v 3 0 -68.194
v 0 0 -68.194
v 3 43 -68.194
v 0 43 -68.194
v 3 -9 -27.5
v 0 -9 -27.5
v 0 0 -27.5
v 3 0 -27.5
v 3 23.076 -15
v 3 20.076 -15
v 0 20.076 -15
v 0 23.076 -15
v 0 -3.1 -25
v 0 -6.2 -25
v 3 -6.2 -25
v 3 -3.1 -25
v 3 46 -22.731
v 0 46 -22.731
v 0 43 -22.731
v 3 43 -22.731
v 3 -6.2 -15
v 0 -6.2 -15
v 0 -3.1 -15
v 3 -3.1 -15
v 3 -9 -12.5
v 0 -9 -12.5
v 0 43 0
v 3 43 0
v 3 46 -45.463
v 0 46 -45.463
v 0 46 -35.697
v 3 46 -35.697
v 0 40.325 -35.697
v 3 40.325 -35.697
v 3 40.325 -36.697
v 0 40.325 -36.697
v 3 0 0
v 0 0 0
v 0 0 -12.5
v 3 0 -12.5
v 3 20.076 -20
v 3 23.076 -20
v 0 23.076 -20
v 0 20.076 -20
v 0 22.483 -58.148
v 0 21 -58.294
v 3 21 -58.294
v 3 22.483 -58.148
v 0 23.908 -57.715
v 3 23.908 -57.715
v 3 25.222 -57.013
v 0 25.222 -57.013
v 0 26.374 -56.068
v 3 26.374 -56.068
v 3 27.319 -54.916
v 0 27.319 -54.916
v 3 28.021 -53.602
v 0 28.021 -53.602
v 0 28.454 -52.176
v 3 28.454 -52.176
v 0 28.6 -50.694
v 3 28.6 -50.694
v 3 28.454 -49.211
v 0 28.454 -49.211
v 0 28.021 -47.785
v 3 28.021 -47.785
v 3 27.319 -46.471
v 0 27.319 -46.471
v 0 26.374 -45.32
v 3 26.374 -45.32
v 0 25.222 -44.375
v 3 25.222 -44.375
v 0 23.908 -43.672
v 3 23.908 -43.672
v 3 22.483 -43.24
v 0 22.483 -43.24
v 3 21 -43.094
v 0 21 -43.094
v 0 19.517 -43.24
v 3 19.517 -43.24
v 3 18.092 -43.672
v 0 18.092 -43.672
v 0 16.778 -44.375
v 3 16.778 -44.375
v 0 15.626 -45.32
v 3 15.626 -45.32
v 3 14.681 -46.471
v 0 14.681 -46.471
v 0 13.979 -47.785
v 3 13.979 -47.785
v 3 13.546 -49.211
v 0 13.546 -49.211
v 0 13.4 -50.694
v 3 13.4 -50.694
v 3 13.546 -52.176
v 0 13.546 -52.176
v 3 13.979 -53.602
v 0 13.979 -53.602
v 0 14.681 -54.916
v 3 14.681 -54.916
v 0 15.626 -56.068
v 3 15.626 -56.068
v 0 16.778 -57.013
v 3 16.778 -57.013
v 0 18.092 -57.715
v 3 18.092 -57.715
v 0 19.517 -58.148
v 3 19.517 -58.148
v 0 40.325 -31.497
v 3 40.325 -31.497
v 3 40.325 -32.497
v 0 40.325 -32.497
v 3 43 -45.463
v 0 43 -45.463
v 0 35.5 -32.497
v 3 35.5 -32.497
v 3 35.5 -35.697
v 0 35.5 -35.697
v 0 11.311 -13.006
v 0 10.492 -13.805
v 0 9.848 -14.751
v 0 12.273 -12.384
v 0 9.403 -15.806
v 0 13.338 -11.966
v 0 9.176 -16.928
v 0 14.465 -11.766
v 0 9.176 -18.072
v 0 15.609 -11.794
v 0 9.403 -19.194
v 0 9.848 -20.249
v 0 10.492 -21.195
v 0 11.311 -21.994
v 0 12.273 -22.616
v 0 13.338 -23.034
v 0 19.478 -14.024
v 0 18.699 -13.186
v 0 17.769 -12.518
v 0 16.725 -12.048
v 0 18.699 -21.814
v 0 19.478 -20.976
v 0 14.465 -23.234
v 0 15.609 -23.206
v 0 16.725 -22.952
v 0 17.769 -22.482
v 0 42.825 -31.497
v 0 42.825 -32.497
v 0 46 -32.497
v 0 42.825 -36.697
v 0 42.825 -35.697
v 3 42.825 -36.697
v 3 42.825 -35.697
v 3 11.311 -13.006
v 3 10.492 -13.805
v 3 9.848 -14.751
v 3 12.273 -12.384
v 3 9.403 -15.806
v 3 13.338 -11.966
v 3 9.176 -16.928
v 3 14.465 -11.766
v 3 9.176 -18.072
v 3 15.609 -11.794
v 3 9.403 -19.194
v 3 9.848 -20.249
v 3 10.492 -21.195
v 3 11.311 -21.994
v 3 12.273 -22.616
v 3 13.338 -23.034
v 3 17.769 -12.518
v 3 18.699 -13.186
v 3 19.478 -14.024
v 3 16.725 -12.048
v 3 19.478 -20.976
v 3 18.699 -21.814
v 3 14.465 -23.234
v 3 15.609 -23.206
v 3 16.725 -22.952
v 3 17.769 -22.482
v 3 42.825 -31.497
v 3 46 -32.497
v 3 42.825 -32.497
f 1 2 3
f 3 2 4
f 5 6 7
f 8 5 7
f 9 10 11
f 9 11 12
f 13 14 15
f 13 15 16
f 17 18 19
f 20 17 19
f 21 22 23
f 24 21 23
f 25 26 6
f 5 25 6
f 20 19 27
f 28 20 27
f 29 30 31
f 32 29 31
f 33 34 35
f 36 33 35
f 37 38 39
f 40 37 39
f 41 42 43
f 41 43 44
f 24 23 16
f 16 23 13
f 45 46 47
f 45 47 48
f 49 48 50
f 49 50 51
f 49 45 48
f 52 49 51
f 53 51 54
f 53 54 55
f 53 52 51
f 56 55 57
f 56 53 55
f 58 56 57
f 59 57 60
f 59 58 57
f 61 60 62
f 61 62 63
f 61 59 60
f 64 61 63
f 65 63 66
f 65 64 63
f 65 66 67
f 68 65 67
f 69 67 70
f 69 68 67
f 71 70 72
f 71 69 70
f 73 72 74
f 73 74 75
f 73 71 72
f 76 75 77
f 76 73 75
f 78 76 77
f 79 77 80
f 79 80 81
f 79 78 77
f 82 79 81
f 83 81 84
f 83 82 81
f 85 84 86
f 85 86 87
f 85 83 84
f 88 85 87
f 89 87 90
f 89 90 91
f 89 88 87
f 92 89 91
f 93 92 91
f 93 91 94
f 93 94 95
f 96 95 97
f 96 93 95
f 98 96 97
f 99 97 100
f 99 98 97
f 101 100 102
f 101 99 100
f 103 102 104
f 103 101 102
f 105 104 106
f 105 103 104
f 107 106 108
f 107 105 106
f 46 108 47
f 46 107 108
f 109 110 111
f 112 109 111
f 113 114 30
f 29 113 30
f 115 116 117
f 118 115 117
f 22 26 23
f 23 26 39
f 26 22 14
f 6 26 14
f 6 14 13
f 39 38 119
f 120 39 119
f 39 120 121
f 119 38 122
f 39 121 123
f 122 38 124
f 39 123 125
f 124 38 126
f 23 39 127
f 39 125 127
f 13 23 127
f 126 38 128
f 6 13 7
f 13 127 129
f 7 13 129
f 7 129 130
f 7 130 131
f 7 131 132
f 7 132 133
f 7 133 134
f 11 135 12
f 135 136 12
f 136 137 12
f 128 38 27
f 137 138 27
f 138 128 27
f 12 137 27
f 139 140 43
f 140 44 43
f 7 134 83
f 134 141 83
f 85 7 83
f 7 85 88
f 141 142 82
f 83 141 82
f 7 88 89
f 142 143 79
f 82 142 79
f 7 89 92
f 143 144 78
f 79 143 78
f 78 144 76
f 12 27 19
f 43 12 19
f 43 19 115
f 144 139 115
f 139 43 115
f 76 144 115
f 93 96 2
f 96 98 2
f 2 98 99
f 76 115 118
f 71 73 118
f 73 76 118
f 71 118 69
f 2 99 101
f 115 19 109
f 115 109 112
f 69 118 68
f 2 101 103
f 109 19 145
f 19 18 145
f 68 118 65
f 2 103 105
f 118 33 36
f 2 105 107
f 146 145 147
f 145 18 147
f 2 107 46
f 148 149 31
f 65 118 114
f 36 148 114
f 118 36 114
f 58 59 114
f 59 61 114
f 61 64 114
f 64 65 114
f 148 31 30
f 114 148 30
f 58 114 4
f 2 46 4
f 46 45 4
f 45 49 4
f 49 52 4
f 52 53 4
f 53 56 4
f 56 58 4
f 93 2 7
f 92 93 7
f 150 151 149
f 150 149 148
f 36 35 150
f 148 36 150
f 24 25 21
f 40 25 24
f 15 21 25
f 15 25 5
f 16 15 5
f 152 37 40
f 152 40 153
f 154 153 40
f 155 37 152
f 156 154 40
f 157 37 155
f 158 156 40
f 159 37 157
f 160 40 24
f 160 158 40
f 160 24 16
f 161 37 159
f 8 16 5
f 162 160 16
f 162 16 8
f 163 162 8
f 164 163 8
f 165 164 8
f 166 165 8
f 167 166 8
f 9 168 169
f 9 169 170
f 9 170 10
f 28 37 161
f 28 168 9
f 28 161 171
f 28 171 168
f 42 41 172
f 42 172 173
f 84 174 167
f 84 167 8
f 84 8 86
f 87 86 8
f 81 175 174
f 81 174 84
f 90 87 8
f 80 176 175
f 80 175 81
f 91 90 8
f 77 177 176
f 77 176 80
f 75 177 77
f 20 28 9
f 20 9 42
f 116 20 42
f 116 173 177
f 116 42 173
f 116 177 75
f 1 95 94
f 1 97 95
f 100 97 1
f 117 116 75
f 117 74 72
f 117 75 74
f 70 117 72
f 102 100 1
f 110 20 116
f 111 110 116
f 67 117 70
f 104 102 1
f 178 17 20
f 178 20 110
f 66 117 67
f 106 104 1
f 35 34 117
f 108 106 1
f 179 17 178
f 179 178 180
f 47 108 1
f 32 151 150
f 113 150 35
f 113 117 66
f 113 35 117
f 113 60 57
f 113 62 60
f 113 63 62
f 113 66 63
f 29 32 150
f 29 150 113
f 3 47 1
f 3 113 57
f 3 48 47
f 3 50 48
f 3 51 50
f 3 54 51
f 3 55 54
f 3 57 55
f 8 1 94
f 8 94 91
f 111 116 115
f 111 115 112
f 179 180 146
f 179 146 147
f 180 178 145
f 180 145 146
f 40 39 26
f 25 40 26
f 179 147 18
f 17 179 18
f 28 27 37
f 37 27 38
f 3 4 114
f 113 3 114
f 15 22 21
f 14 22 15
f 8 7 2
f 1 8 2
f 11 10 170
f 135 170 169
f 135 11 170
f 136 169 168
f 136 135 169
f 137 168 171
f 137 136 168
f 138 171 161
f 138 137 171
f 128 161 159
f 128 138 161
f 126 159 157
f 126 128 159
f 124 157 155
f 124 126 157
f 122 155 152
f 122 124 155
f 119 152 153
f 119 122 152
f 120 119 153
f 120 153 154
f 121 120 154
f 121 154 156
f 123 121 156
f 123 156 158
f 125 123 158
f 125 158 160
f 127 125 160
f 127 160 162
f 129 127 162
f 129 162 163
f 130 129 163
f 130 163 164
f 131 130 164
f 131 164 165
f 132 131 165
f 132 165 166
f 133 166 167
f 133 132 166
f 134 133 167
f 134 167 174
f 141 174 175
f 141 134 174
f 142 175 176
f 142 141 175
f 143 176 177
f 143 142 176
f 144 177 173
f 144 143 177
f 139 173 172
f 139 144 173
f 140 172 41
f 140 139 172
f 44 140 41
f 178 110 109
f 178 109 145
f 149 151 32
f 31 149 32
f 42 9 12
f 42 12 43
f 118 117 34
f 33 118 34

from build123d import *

# Parameters (mm, degrees)
SKETCH1_W               = 10
SKETCH1_H               = 3.1
SKETCH1_R               = 5.75
SKETCH1_R_2             = 7.6
BOSS_EXTRUDE1_DEPTH     = 3
SKETCH2_W               = 5.2
SKETCH2_H               = 2.5
SKETCH2_W_2             = 3.2
SKETCH2_H_2             = 10.5
CUT_EXTRUDE1_DEPTH      = 1
CUT_EXTRUDE1_DEPTH_BACK = 4


with BuildPart() as part:
    # Sketch1 → Boss-Extrude1 (new body)
    with BuildSketch(Plane(origin=(0, 0, 0), x_dir=(0, 0, -1), z_dir=(1, 0, 0))):
        Polygon((0, 43), (0, 0), (12.5, 0), (12.5, -9), (27.5, -9), (27.5, 0), (68.19375928, 0), (68.19375928, 43), (45.462506187, 43), (45.462506187, 46), (22.731253093, 46), (22.731253093, 43), align=None)
        with Locations((20, -4.65)):
            Rectangle(SKETCH1_W, SKETCH1_H, mode=Mode.SUBTRACT)
        with Locations((17.5, 14.8978)):
            Circle(SKETCH1_R, mode=Mode.SUBTRACT)
        with Locations((50.69375928, 21)):
            Circle(SKETCH1_R_2, mode=Mode.SUBTRACT)
    extrude(amount=BOSS_EXTRUDE1_DEPTH)

    # Sketch2 → Cut-Extrude1 (cut, two sides)
    with BuildSketch(Plane(origin=(3, 0, 0), x_dir=(0, 0, -1), z_dir=(1, 0, 0))) as cut_extrude1_sk:
        with BuildLine():
            Line((15, 20.075878794), (15, 23.075878794))
            Line((15, 23.075878794), (20, 23.075878794))
            Line((20, 23.075878794), (20, 20.075878794))
            ThreePointArc((20, 20.075878794), (17.5, 20.6478), (15, 20.075878794))
        make_face()
        with Locations((34.09687964, 41.575)):
            Rectangle(SKETCH2_W, SKETCH2_H)
        with Locations((34.09687964, 40.75)):
            Rectangle(SKETCH2_W_2, SKETCH2_H_2)
    extrude(amount=CUT_EXTRUDE1_DEPTH, mode=Mode.SUBTRACT)
    extrude(cut_extrude1_sk.sketch, amount=-CUT_EXTRUDE1_DEPTH_BACK, mode=Mode.SUBTRACT)


solid = part.part
